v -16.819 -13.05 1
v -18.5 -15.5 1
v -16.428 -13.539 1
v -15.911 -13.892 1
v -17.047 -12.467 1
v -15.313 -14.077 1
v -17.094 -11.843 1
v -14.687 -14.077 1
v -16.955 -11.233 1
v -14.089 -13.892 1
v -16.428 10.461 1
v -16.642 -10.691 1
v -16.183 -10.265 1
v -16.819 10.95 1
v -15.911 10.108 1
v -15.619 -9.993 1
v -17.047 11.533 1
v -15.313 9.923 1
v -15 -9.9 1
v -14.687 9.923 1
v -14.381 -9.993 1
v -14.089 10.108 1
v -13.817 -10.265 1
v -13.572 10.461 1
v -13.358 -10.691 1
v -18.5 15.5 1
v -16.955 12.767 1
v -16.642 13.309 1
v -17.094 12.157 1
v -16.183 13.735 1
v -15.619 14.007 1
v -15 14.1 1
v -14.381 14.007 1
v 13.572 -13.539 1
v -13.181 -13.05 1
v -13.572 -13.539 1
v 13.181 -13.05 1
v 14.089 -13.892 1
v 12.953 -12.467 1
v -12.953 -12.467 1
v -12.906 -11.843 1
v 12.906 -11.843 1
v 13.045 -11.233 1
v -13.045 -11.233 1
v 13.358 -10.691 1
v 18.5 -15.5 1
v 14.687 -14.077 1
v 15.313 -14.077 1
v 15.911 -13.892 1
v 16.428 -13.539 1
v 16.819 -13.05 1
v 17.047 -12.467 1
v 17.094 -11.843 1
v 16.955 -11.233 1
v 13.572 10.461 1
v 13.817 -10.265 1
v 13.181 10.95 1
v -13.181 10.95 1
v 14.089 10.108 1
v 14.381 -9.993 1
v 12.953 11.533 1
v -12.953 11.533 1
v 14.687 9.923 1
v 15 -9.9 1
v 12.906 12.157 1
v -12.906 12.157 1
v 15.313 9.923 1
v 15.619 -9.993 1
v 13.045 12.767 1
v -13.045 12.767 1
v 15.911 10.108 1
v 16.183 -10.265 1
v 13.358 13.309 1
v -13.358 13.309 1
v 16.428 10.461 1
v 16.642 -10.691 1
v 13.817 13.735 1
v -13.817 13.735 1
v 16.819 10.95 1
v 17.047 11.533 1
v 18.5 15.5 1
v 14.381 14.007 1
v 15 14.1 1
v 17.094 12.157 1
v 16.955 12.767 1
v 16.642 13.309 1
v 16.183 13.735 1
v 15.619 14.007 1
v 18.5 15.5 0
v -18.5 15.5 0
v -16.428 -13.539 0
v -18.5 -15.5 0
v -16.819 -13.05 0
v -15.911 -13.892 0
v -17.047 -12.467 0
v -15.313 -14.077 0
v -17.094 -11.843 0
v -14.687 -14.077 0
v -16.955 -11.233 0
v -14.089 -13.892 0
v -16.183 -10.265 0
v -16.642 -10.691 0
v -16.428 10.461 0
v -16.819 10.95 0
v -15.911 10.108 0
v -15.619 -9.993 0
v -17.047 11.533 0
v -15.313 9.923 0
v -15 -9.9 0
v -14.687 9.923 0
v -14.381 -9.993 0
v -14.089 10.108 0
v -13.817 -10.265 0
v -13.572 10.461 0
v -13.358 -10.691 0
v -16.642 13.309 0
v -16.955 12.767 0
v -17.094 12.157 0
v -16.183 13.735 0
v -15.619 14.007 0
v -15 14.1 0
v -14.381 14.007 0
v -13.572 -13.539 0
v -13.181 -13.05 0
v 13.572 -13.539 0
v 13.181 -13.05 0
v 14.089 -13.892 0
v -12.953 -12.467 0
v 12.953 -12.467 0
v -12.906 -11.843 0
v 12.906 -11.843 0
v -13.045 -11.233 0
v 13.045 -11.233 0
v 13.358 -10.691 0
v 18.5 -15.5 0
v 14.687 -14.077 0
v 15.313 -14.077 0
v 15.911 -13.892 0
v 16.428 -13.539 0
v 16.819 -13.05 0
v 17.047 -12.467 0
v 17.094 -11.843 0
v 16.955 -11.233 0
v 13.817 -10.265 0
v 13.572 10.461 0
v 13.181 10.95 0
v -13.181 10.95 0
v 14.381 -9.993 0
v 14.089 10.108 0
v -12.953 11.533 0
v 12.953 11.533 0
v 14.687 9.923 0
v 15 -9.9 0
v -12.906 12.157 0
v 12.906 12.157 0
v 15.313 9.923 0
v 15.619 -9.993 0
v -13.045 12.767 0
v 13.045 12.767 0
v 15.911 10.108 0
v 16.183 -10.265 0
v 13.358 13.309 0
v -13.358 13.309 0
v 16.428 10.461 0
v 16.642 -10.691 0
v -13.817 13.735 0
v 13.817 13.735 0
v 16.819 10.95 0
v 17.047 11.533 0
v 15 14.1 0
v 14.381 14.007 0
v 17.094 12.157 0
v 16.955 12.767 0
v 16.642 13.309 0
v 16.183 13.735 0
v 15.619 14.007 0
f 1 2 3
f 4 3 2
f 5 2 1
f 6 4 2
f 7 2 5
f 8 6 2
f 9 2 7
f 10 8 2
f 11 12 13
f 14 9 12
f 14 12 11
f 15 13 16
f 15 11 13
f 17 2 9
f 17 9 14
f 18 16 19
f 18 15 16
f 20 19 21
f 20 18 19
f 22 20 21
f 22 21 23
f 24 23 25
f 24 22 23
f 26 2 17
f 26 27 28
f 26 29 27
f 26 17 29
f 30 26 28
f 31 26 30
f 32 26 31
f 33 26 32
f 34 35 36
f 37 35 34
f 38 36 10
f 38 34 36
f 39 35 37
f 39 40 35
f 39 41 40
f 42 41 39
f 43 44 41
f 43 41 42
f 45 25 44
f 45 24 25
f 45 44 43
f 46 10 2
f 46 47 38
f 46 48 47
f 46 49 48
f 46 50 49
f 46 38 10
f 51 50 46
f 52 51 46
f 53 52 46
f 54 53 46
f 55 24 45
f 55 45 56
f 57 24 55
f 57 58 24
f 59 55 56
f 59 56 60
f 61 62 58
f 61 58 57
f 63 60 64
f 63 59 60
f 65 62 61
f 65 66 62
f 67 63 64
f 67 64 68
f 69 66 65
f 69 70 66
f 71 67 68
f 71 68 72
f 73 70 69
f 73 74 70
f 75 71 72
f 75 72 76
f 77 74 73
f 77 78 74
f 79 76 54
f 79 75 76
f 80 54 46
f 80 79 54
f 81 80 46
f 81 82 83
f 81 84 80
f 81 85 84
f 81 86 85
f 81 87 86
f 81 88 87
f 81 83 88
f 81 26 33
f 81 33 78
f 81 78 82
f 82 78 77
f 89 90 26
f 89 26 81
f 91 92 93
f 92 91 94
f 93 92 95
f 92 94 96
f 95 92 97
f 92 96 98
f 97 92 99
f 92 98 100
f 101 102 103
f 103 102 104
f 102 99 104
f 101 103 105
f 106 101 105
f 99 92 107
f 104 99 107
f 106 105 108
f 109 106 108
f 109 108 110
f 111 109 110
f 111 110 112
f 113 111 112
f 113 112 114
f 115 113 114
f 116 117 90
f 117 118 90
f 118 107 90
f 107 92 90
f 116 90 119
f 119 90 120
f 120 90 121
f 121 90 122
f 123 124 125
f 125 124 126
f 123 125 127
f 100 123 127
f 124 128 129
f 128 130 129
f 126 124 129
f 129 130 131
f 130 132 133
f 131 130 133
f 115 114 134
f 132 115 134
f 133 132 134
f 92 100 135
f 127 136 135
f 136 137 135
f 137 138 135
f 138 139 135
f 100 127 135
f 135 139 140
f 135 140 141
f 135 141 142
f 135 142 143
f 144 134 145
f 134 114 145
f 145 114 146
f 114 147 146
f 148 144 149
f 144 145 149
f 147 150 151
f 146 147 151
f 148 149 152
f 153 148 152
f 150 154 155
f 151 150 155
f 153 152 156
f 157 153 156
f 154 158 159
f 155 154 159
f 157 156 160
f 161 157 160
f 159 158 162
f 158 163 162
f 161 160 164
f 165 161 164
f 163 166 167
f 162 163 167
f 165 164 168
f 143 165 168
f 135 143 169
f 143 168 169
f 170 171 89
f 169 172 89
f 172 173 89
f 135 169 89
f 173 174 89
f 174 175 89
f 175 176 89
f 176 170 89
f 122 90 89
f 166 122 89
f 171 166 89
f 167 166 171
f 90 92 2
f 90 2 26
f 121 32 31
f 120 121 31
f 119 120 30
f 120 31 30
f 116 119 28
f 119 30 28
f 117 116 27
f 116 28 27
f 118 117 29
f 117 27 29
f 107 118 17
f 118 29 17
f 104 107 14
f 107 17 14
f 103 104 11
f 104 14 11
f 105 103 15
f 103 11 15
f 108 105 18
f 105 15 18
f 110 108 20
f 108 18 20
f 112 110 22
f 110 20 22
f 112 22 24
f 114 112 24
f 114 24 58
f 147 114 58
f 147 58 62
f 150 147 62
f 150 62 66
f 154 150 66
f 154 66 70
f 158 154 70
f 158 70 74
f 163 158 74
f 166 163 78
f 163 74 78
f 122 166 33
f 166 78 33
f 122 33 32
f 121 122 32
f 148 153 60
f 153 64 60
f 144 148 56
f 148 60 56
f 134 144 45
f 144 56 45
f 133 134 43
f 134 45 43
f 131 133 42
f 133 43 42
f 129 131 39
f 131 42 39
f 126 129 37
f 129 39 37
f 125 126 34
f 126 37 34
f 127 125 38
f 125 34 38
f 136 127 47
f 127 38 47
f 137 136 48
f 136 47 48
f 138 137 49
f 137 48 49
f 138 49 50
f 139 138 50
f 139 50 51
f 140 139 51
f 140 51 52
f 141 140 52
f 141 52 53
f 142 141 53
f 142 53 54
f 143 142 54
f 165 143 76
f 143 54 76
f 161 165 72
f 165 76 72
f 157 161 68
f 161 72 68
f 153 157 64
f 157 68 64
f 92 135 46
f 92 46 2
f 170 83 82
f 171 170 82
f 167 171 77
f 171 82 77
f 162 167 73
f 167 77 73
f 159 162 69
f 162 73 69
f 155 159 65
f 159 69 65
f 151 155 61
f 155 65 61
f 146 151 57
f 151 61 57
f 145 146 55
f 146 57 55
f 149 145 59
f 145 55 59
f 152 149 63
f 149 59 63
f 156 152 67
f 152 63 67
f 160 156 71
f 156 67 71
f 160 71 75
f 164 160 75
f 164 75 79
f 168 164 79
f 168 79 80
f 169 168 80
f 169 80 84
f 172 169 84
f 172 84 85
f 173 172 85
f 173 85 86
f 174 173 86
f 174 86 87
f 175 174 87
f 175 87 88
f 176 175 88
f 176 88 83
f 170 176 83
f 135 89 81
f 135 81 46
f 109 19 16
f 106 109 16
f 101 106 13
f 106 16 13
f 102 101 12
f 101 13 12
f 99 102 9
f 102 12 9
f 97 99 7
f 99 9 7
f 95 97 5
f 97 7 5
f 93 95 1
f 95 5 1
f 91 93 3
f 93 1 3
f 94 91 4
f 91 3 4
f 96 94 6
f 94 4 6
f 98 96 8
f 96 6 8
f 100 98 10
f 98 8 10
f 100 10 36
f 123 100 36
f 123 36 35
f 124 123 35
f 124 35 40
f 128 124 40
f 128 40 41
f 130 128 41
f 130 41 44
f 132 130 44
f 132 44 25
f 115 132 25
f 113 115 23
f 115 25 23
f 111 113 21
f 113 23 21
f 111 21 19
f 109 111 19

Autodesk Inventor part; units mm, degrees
ref_plane "YZ Plane" through (0, 0, 0) normal (1, 0, 0) x (0, 1, 0)
ref_plane "XZ Plane" through (0, 0, 0) normal (0, 1, 0) x (-1, 0, 0)
ref_plane "XY Plane" through (0, 0, 0) normal (0, 0, 1) x (1, 0, 0)
sketch "草图1" plane through (0, 0, 0) normal (0, 0, 1) x (1, 0, 0)
  line L0 (18.5, -15.5) -> (-18.5, -15.5)
  line L1 (-18.5, -15.5) -> (-18.5, 15.5)
  line L2 (-18.5, 15.5) -> (18.5, 15.5)
  line L3 (18.5, 15.5) -> (18.5, -15.5)
  line L4 (18.5, -15.5) -> (-18.5, 15.5) construction
  line L5 (-18.5, -15.5) -> (18.5, 15.5) construction
  line L6 (0, 0) -> (-24.9379, 0) construction
  line L7 (0, 0) -> (0, 16.8364) construction
  point P0 (-15, 12)
  point P1 (-15, -12)
  point P2 (15, 12)
  point P3 (15, -12)
  dimension "d0" = 31
  dimension "d1" = 37
  dimension "d2" = 12
  dimension "d3" = 15
extrude "拉伸1" add sketch "草图1" along normal blind 1
hole "孔1" at (-15, 12, 0) at (-15, -12, 0) at (15, 12, 0) at (15, -12, 0) direction (0, 0, 1) diameter 4.2 end through all
properties part number "自制垫片"
